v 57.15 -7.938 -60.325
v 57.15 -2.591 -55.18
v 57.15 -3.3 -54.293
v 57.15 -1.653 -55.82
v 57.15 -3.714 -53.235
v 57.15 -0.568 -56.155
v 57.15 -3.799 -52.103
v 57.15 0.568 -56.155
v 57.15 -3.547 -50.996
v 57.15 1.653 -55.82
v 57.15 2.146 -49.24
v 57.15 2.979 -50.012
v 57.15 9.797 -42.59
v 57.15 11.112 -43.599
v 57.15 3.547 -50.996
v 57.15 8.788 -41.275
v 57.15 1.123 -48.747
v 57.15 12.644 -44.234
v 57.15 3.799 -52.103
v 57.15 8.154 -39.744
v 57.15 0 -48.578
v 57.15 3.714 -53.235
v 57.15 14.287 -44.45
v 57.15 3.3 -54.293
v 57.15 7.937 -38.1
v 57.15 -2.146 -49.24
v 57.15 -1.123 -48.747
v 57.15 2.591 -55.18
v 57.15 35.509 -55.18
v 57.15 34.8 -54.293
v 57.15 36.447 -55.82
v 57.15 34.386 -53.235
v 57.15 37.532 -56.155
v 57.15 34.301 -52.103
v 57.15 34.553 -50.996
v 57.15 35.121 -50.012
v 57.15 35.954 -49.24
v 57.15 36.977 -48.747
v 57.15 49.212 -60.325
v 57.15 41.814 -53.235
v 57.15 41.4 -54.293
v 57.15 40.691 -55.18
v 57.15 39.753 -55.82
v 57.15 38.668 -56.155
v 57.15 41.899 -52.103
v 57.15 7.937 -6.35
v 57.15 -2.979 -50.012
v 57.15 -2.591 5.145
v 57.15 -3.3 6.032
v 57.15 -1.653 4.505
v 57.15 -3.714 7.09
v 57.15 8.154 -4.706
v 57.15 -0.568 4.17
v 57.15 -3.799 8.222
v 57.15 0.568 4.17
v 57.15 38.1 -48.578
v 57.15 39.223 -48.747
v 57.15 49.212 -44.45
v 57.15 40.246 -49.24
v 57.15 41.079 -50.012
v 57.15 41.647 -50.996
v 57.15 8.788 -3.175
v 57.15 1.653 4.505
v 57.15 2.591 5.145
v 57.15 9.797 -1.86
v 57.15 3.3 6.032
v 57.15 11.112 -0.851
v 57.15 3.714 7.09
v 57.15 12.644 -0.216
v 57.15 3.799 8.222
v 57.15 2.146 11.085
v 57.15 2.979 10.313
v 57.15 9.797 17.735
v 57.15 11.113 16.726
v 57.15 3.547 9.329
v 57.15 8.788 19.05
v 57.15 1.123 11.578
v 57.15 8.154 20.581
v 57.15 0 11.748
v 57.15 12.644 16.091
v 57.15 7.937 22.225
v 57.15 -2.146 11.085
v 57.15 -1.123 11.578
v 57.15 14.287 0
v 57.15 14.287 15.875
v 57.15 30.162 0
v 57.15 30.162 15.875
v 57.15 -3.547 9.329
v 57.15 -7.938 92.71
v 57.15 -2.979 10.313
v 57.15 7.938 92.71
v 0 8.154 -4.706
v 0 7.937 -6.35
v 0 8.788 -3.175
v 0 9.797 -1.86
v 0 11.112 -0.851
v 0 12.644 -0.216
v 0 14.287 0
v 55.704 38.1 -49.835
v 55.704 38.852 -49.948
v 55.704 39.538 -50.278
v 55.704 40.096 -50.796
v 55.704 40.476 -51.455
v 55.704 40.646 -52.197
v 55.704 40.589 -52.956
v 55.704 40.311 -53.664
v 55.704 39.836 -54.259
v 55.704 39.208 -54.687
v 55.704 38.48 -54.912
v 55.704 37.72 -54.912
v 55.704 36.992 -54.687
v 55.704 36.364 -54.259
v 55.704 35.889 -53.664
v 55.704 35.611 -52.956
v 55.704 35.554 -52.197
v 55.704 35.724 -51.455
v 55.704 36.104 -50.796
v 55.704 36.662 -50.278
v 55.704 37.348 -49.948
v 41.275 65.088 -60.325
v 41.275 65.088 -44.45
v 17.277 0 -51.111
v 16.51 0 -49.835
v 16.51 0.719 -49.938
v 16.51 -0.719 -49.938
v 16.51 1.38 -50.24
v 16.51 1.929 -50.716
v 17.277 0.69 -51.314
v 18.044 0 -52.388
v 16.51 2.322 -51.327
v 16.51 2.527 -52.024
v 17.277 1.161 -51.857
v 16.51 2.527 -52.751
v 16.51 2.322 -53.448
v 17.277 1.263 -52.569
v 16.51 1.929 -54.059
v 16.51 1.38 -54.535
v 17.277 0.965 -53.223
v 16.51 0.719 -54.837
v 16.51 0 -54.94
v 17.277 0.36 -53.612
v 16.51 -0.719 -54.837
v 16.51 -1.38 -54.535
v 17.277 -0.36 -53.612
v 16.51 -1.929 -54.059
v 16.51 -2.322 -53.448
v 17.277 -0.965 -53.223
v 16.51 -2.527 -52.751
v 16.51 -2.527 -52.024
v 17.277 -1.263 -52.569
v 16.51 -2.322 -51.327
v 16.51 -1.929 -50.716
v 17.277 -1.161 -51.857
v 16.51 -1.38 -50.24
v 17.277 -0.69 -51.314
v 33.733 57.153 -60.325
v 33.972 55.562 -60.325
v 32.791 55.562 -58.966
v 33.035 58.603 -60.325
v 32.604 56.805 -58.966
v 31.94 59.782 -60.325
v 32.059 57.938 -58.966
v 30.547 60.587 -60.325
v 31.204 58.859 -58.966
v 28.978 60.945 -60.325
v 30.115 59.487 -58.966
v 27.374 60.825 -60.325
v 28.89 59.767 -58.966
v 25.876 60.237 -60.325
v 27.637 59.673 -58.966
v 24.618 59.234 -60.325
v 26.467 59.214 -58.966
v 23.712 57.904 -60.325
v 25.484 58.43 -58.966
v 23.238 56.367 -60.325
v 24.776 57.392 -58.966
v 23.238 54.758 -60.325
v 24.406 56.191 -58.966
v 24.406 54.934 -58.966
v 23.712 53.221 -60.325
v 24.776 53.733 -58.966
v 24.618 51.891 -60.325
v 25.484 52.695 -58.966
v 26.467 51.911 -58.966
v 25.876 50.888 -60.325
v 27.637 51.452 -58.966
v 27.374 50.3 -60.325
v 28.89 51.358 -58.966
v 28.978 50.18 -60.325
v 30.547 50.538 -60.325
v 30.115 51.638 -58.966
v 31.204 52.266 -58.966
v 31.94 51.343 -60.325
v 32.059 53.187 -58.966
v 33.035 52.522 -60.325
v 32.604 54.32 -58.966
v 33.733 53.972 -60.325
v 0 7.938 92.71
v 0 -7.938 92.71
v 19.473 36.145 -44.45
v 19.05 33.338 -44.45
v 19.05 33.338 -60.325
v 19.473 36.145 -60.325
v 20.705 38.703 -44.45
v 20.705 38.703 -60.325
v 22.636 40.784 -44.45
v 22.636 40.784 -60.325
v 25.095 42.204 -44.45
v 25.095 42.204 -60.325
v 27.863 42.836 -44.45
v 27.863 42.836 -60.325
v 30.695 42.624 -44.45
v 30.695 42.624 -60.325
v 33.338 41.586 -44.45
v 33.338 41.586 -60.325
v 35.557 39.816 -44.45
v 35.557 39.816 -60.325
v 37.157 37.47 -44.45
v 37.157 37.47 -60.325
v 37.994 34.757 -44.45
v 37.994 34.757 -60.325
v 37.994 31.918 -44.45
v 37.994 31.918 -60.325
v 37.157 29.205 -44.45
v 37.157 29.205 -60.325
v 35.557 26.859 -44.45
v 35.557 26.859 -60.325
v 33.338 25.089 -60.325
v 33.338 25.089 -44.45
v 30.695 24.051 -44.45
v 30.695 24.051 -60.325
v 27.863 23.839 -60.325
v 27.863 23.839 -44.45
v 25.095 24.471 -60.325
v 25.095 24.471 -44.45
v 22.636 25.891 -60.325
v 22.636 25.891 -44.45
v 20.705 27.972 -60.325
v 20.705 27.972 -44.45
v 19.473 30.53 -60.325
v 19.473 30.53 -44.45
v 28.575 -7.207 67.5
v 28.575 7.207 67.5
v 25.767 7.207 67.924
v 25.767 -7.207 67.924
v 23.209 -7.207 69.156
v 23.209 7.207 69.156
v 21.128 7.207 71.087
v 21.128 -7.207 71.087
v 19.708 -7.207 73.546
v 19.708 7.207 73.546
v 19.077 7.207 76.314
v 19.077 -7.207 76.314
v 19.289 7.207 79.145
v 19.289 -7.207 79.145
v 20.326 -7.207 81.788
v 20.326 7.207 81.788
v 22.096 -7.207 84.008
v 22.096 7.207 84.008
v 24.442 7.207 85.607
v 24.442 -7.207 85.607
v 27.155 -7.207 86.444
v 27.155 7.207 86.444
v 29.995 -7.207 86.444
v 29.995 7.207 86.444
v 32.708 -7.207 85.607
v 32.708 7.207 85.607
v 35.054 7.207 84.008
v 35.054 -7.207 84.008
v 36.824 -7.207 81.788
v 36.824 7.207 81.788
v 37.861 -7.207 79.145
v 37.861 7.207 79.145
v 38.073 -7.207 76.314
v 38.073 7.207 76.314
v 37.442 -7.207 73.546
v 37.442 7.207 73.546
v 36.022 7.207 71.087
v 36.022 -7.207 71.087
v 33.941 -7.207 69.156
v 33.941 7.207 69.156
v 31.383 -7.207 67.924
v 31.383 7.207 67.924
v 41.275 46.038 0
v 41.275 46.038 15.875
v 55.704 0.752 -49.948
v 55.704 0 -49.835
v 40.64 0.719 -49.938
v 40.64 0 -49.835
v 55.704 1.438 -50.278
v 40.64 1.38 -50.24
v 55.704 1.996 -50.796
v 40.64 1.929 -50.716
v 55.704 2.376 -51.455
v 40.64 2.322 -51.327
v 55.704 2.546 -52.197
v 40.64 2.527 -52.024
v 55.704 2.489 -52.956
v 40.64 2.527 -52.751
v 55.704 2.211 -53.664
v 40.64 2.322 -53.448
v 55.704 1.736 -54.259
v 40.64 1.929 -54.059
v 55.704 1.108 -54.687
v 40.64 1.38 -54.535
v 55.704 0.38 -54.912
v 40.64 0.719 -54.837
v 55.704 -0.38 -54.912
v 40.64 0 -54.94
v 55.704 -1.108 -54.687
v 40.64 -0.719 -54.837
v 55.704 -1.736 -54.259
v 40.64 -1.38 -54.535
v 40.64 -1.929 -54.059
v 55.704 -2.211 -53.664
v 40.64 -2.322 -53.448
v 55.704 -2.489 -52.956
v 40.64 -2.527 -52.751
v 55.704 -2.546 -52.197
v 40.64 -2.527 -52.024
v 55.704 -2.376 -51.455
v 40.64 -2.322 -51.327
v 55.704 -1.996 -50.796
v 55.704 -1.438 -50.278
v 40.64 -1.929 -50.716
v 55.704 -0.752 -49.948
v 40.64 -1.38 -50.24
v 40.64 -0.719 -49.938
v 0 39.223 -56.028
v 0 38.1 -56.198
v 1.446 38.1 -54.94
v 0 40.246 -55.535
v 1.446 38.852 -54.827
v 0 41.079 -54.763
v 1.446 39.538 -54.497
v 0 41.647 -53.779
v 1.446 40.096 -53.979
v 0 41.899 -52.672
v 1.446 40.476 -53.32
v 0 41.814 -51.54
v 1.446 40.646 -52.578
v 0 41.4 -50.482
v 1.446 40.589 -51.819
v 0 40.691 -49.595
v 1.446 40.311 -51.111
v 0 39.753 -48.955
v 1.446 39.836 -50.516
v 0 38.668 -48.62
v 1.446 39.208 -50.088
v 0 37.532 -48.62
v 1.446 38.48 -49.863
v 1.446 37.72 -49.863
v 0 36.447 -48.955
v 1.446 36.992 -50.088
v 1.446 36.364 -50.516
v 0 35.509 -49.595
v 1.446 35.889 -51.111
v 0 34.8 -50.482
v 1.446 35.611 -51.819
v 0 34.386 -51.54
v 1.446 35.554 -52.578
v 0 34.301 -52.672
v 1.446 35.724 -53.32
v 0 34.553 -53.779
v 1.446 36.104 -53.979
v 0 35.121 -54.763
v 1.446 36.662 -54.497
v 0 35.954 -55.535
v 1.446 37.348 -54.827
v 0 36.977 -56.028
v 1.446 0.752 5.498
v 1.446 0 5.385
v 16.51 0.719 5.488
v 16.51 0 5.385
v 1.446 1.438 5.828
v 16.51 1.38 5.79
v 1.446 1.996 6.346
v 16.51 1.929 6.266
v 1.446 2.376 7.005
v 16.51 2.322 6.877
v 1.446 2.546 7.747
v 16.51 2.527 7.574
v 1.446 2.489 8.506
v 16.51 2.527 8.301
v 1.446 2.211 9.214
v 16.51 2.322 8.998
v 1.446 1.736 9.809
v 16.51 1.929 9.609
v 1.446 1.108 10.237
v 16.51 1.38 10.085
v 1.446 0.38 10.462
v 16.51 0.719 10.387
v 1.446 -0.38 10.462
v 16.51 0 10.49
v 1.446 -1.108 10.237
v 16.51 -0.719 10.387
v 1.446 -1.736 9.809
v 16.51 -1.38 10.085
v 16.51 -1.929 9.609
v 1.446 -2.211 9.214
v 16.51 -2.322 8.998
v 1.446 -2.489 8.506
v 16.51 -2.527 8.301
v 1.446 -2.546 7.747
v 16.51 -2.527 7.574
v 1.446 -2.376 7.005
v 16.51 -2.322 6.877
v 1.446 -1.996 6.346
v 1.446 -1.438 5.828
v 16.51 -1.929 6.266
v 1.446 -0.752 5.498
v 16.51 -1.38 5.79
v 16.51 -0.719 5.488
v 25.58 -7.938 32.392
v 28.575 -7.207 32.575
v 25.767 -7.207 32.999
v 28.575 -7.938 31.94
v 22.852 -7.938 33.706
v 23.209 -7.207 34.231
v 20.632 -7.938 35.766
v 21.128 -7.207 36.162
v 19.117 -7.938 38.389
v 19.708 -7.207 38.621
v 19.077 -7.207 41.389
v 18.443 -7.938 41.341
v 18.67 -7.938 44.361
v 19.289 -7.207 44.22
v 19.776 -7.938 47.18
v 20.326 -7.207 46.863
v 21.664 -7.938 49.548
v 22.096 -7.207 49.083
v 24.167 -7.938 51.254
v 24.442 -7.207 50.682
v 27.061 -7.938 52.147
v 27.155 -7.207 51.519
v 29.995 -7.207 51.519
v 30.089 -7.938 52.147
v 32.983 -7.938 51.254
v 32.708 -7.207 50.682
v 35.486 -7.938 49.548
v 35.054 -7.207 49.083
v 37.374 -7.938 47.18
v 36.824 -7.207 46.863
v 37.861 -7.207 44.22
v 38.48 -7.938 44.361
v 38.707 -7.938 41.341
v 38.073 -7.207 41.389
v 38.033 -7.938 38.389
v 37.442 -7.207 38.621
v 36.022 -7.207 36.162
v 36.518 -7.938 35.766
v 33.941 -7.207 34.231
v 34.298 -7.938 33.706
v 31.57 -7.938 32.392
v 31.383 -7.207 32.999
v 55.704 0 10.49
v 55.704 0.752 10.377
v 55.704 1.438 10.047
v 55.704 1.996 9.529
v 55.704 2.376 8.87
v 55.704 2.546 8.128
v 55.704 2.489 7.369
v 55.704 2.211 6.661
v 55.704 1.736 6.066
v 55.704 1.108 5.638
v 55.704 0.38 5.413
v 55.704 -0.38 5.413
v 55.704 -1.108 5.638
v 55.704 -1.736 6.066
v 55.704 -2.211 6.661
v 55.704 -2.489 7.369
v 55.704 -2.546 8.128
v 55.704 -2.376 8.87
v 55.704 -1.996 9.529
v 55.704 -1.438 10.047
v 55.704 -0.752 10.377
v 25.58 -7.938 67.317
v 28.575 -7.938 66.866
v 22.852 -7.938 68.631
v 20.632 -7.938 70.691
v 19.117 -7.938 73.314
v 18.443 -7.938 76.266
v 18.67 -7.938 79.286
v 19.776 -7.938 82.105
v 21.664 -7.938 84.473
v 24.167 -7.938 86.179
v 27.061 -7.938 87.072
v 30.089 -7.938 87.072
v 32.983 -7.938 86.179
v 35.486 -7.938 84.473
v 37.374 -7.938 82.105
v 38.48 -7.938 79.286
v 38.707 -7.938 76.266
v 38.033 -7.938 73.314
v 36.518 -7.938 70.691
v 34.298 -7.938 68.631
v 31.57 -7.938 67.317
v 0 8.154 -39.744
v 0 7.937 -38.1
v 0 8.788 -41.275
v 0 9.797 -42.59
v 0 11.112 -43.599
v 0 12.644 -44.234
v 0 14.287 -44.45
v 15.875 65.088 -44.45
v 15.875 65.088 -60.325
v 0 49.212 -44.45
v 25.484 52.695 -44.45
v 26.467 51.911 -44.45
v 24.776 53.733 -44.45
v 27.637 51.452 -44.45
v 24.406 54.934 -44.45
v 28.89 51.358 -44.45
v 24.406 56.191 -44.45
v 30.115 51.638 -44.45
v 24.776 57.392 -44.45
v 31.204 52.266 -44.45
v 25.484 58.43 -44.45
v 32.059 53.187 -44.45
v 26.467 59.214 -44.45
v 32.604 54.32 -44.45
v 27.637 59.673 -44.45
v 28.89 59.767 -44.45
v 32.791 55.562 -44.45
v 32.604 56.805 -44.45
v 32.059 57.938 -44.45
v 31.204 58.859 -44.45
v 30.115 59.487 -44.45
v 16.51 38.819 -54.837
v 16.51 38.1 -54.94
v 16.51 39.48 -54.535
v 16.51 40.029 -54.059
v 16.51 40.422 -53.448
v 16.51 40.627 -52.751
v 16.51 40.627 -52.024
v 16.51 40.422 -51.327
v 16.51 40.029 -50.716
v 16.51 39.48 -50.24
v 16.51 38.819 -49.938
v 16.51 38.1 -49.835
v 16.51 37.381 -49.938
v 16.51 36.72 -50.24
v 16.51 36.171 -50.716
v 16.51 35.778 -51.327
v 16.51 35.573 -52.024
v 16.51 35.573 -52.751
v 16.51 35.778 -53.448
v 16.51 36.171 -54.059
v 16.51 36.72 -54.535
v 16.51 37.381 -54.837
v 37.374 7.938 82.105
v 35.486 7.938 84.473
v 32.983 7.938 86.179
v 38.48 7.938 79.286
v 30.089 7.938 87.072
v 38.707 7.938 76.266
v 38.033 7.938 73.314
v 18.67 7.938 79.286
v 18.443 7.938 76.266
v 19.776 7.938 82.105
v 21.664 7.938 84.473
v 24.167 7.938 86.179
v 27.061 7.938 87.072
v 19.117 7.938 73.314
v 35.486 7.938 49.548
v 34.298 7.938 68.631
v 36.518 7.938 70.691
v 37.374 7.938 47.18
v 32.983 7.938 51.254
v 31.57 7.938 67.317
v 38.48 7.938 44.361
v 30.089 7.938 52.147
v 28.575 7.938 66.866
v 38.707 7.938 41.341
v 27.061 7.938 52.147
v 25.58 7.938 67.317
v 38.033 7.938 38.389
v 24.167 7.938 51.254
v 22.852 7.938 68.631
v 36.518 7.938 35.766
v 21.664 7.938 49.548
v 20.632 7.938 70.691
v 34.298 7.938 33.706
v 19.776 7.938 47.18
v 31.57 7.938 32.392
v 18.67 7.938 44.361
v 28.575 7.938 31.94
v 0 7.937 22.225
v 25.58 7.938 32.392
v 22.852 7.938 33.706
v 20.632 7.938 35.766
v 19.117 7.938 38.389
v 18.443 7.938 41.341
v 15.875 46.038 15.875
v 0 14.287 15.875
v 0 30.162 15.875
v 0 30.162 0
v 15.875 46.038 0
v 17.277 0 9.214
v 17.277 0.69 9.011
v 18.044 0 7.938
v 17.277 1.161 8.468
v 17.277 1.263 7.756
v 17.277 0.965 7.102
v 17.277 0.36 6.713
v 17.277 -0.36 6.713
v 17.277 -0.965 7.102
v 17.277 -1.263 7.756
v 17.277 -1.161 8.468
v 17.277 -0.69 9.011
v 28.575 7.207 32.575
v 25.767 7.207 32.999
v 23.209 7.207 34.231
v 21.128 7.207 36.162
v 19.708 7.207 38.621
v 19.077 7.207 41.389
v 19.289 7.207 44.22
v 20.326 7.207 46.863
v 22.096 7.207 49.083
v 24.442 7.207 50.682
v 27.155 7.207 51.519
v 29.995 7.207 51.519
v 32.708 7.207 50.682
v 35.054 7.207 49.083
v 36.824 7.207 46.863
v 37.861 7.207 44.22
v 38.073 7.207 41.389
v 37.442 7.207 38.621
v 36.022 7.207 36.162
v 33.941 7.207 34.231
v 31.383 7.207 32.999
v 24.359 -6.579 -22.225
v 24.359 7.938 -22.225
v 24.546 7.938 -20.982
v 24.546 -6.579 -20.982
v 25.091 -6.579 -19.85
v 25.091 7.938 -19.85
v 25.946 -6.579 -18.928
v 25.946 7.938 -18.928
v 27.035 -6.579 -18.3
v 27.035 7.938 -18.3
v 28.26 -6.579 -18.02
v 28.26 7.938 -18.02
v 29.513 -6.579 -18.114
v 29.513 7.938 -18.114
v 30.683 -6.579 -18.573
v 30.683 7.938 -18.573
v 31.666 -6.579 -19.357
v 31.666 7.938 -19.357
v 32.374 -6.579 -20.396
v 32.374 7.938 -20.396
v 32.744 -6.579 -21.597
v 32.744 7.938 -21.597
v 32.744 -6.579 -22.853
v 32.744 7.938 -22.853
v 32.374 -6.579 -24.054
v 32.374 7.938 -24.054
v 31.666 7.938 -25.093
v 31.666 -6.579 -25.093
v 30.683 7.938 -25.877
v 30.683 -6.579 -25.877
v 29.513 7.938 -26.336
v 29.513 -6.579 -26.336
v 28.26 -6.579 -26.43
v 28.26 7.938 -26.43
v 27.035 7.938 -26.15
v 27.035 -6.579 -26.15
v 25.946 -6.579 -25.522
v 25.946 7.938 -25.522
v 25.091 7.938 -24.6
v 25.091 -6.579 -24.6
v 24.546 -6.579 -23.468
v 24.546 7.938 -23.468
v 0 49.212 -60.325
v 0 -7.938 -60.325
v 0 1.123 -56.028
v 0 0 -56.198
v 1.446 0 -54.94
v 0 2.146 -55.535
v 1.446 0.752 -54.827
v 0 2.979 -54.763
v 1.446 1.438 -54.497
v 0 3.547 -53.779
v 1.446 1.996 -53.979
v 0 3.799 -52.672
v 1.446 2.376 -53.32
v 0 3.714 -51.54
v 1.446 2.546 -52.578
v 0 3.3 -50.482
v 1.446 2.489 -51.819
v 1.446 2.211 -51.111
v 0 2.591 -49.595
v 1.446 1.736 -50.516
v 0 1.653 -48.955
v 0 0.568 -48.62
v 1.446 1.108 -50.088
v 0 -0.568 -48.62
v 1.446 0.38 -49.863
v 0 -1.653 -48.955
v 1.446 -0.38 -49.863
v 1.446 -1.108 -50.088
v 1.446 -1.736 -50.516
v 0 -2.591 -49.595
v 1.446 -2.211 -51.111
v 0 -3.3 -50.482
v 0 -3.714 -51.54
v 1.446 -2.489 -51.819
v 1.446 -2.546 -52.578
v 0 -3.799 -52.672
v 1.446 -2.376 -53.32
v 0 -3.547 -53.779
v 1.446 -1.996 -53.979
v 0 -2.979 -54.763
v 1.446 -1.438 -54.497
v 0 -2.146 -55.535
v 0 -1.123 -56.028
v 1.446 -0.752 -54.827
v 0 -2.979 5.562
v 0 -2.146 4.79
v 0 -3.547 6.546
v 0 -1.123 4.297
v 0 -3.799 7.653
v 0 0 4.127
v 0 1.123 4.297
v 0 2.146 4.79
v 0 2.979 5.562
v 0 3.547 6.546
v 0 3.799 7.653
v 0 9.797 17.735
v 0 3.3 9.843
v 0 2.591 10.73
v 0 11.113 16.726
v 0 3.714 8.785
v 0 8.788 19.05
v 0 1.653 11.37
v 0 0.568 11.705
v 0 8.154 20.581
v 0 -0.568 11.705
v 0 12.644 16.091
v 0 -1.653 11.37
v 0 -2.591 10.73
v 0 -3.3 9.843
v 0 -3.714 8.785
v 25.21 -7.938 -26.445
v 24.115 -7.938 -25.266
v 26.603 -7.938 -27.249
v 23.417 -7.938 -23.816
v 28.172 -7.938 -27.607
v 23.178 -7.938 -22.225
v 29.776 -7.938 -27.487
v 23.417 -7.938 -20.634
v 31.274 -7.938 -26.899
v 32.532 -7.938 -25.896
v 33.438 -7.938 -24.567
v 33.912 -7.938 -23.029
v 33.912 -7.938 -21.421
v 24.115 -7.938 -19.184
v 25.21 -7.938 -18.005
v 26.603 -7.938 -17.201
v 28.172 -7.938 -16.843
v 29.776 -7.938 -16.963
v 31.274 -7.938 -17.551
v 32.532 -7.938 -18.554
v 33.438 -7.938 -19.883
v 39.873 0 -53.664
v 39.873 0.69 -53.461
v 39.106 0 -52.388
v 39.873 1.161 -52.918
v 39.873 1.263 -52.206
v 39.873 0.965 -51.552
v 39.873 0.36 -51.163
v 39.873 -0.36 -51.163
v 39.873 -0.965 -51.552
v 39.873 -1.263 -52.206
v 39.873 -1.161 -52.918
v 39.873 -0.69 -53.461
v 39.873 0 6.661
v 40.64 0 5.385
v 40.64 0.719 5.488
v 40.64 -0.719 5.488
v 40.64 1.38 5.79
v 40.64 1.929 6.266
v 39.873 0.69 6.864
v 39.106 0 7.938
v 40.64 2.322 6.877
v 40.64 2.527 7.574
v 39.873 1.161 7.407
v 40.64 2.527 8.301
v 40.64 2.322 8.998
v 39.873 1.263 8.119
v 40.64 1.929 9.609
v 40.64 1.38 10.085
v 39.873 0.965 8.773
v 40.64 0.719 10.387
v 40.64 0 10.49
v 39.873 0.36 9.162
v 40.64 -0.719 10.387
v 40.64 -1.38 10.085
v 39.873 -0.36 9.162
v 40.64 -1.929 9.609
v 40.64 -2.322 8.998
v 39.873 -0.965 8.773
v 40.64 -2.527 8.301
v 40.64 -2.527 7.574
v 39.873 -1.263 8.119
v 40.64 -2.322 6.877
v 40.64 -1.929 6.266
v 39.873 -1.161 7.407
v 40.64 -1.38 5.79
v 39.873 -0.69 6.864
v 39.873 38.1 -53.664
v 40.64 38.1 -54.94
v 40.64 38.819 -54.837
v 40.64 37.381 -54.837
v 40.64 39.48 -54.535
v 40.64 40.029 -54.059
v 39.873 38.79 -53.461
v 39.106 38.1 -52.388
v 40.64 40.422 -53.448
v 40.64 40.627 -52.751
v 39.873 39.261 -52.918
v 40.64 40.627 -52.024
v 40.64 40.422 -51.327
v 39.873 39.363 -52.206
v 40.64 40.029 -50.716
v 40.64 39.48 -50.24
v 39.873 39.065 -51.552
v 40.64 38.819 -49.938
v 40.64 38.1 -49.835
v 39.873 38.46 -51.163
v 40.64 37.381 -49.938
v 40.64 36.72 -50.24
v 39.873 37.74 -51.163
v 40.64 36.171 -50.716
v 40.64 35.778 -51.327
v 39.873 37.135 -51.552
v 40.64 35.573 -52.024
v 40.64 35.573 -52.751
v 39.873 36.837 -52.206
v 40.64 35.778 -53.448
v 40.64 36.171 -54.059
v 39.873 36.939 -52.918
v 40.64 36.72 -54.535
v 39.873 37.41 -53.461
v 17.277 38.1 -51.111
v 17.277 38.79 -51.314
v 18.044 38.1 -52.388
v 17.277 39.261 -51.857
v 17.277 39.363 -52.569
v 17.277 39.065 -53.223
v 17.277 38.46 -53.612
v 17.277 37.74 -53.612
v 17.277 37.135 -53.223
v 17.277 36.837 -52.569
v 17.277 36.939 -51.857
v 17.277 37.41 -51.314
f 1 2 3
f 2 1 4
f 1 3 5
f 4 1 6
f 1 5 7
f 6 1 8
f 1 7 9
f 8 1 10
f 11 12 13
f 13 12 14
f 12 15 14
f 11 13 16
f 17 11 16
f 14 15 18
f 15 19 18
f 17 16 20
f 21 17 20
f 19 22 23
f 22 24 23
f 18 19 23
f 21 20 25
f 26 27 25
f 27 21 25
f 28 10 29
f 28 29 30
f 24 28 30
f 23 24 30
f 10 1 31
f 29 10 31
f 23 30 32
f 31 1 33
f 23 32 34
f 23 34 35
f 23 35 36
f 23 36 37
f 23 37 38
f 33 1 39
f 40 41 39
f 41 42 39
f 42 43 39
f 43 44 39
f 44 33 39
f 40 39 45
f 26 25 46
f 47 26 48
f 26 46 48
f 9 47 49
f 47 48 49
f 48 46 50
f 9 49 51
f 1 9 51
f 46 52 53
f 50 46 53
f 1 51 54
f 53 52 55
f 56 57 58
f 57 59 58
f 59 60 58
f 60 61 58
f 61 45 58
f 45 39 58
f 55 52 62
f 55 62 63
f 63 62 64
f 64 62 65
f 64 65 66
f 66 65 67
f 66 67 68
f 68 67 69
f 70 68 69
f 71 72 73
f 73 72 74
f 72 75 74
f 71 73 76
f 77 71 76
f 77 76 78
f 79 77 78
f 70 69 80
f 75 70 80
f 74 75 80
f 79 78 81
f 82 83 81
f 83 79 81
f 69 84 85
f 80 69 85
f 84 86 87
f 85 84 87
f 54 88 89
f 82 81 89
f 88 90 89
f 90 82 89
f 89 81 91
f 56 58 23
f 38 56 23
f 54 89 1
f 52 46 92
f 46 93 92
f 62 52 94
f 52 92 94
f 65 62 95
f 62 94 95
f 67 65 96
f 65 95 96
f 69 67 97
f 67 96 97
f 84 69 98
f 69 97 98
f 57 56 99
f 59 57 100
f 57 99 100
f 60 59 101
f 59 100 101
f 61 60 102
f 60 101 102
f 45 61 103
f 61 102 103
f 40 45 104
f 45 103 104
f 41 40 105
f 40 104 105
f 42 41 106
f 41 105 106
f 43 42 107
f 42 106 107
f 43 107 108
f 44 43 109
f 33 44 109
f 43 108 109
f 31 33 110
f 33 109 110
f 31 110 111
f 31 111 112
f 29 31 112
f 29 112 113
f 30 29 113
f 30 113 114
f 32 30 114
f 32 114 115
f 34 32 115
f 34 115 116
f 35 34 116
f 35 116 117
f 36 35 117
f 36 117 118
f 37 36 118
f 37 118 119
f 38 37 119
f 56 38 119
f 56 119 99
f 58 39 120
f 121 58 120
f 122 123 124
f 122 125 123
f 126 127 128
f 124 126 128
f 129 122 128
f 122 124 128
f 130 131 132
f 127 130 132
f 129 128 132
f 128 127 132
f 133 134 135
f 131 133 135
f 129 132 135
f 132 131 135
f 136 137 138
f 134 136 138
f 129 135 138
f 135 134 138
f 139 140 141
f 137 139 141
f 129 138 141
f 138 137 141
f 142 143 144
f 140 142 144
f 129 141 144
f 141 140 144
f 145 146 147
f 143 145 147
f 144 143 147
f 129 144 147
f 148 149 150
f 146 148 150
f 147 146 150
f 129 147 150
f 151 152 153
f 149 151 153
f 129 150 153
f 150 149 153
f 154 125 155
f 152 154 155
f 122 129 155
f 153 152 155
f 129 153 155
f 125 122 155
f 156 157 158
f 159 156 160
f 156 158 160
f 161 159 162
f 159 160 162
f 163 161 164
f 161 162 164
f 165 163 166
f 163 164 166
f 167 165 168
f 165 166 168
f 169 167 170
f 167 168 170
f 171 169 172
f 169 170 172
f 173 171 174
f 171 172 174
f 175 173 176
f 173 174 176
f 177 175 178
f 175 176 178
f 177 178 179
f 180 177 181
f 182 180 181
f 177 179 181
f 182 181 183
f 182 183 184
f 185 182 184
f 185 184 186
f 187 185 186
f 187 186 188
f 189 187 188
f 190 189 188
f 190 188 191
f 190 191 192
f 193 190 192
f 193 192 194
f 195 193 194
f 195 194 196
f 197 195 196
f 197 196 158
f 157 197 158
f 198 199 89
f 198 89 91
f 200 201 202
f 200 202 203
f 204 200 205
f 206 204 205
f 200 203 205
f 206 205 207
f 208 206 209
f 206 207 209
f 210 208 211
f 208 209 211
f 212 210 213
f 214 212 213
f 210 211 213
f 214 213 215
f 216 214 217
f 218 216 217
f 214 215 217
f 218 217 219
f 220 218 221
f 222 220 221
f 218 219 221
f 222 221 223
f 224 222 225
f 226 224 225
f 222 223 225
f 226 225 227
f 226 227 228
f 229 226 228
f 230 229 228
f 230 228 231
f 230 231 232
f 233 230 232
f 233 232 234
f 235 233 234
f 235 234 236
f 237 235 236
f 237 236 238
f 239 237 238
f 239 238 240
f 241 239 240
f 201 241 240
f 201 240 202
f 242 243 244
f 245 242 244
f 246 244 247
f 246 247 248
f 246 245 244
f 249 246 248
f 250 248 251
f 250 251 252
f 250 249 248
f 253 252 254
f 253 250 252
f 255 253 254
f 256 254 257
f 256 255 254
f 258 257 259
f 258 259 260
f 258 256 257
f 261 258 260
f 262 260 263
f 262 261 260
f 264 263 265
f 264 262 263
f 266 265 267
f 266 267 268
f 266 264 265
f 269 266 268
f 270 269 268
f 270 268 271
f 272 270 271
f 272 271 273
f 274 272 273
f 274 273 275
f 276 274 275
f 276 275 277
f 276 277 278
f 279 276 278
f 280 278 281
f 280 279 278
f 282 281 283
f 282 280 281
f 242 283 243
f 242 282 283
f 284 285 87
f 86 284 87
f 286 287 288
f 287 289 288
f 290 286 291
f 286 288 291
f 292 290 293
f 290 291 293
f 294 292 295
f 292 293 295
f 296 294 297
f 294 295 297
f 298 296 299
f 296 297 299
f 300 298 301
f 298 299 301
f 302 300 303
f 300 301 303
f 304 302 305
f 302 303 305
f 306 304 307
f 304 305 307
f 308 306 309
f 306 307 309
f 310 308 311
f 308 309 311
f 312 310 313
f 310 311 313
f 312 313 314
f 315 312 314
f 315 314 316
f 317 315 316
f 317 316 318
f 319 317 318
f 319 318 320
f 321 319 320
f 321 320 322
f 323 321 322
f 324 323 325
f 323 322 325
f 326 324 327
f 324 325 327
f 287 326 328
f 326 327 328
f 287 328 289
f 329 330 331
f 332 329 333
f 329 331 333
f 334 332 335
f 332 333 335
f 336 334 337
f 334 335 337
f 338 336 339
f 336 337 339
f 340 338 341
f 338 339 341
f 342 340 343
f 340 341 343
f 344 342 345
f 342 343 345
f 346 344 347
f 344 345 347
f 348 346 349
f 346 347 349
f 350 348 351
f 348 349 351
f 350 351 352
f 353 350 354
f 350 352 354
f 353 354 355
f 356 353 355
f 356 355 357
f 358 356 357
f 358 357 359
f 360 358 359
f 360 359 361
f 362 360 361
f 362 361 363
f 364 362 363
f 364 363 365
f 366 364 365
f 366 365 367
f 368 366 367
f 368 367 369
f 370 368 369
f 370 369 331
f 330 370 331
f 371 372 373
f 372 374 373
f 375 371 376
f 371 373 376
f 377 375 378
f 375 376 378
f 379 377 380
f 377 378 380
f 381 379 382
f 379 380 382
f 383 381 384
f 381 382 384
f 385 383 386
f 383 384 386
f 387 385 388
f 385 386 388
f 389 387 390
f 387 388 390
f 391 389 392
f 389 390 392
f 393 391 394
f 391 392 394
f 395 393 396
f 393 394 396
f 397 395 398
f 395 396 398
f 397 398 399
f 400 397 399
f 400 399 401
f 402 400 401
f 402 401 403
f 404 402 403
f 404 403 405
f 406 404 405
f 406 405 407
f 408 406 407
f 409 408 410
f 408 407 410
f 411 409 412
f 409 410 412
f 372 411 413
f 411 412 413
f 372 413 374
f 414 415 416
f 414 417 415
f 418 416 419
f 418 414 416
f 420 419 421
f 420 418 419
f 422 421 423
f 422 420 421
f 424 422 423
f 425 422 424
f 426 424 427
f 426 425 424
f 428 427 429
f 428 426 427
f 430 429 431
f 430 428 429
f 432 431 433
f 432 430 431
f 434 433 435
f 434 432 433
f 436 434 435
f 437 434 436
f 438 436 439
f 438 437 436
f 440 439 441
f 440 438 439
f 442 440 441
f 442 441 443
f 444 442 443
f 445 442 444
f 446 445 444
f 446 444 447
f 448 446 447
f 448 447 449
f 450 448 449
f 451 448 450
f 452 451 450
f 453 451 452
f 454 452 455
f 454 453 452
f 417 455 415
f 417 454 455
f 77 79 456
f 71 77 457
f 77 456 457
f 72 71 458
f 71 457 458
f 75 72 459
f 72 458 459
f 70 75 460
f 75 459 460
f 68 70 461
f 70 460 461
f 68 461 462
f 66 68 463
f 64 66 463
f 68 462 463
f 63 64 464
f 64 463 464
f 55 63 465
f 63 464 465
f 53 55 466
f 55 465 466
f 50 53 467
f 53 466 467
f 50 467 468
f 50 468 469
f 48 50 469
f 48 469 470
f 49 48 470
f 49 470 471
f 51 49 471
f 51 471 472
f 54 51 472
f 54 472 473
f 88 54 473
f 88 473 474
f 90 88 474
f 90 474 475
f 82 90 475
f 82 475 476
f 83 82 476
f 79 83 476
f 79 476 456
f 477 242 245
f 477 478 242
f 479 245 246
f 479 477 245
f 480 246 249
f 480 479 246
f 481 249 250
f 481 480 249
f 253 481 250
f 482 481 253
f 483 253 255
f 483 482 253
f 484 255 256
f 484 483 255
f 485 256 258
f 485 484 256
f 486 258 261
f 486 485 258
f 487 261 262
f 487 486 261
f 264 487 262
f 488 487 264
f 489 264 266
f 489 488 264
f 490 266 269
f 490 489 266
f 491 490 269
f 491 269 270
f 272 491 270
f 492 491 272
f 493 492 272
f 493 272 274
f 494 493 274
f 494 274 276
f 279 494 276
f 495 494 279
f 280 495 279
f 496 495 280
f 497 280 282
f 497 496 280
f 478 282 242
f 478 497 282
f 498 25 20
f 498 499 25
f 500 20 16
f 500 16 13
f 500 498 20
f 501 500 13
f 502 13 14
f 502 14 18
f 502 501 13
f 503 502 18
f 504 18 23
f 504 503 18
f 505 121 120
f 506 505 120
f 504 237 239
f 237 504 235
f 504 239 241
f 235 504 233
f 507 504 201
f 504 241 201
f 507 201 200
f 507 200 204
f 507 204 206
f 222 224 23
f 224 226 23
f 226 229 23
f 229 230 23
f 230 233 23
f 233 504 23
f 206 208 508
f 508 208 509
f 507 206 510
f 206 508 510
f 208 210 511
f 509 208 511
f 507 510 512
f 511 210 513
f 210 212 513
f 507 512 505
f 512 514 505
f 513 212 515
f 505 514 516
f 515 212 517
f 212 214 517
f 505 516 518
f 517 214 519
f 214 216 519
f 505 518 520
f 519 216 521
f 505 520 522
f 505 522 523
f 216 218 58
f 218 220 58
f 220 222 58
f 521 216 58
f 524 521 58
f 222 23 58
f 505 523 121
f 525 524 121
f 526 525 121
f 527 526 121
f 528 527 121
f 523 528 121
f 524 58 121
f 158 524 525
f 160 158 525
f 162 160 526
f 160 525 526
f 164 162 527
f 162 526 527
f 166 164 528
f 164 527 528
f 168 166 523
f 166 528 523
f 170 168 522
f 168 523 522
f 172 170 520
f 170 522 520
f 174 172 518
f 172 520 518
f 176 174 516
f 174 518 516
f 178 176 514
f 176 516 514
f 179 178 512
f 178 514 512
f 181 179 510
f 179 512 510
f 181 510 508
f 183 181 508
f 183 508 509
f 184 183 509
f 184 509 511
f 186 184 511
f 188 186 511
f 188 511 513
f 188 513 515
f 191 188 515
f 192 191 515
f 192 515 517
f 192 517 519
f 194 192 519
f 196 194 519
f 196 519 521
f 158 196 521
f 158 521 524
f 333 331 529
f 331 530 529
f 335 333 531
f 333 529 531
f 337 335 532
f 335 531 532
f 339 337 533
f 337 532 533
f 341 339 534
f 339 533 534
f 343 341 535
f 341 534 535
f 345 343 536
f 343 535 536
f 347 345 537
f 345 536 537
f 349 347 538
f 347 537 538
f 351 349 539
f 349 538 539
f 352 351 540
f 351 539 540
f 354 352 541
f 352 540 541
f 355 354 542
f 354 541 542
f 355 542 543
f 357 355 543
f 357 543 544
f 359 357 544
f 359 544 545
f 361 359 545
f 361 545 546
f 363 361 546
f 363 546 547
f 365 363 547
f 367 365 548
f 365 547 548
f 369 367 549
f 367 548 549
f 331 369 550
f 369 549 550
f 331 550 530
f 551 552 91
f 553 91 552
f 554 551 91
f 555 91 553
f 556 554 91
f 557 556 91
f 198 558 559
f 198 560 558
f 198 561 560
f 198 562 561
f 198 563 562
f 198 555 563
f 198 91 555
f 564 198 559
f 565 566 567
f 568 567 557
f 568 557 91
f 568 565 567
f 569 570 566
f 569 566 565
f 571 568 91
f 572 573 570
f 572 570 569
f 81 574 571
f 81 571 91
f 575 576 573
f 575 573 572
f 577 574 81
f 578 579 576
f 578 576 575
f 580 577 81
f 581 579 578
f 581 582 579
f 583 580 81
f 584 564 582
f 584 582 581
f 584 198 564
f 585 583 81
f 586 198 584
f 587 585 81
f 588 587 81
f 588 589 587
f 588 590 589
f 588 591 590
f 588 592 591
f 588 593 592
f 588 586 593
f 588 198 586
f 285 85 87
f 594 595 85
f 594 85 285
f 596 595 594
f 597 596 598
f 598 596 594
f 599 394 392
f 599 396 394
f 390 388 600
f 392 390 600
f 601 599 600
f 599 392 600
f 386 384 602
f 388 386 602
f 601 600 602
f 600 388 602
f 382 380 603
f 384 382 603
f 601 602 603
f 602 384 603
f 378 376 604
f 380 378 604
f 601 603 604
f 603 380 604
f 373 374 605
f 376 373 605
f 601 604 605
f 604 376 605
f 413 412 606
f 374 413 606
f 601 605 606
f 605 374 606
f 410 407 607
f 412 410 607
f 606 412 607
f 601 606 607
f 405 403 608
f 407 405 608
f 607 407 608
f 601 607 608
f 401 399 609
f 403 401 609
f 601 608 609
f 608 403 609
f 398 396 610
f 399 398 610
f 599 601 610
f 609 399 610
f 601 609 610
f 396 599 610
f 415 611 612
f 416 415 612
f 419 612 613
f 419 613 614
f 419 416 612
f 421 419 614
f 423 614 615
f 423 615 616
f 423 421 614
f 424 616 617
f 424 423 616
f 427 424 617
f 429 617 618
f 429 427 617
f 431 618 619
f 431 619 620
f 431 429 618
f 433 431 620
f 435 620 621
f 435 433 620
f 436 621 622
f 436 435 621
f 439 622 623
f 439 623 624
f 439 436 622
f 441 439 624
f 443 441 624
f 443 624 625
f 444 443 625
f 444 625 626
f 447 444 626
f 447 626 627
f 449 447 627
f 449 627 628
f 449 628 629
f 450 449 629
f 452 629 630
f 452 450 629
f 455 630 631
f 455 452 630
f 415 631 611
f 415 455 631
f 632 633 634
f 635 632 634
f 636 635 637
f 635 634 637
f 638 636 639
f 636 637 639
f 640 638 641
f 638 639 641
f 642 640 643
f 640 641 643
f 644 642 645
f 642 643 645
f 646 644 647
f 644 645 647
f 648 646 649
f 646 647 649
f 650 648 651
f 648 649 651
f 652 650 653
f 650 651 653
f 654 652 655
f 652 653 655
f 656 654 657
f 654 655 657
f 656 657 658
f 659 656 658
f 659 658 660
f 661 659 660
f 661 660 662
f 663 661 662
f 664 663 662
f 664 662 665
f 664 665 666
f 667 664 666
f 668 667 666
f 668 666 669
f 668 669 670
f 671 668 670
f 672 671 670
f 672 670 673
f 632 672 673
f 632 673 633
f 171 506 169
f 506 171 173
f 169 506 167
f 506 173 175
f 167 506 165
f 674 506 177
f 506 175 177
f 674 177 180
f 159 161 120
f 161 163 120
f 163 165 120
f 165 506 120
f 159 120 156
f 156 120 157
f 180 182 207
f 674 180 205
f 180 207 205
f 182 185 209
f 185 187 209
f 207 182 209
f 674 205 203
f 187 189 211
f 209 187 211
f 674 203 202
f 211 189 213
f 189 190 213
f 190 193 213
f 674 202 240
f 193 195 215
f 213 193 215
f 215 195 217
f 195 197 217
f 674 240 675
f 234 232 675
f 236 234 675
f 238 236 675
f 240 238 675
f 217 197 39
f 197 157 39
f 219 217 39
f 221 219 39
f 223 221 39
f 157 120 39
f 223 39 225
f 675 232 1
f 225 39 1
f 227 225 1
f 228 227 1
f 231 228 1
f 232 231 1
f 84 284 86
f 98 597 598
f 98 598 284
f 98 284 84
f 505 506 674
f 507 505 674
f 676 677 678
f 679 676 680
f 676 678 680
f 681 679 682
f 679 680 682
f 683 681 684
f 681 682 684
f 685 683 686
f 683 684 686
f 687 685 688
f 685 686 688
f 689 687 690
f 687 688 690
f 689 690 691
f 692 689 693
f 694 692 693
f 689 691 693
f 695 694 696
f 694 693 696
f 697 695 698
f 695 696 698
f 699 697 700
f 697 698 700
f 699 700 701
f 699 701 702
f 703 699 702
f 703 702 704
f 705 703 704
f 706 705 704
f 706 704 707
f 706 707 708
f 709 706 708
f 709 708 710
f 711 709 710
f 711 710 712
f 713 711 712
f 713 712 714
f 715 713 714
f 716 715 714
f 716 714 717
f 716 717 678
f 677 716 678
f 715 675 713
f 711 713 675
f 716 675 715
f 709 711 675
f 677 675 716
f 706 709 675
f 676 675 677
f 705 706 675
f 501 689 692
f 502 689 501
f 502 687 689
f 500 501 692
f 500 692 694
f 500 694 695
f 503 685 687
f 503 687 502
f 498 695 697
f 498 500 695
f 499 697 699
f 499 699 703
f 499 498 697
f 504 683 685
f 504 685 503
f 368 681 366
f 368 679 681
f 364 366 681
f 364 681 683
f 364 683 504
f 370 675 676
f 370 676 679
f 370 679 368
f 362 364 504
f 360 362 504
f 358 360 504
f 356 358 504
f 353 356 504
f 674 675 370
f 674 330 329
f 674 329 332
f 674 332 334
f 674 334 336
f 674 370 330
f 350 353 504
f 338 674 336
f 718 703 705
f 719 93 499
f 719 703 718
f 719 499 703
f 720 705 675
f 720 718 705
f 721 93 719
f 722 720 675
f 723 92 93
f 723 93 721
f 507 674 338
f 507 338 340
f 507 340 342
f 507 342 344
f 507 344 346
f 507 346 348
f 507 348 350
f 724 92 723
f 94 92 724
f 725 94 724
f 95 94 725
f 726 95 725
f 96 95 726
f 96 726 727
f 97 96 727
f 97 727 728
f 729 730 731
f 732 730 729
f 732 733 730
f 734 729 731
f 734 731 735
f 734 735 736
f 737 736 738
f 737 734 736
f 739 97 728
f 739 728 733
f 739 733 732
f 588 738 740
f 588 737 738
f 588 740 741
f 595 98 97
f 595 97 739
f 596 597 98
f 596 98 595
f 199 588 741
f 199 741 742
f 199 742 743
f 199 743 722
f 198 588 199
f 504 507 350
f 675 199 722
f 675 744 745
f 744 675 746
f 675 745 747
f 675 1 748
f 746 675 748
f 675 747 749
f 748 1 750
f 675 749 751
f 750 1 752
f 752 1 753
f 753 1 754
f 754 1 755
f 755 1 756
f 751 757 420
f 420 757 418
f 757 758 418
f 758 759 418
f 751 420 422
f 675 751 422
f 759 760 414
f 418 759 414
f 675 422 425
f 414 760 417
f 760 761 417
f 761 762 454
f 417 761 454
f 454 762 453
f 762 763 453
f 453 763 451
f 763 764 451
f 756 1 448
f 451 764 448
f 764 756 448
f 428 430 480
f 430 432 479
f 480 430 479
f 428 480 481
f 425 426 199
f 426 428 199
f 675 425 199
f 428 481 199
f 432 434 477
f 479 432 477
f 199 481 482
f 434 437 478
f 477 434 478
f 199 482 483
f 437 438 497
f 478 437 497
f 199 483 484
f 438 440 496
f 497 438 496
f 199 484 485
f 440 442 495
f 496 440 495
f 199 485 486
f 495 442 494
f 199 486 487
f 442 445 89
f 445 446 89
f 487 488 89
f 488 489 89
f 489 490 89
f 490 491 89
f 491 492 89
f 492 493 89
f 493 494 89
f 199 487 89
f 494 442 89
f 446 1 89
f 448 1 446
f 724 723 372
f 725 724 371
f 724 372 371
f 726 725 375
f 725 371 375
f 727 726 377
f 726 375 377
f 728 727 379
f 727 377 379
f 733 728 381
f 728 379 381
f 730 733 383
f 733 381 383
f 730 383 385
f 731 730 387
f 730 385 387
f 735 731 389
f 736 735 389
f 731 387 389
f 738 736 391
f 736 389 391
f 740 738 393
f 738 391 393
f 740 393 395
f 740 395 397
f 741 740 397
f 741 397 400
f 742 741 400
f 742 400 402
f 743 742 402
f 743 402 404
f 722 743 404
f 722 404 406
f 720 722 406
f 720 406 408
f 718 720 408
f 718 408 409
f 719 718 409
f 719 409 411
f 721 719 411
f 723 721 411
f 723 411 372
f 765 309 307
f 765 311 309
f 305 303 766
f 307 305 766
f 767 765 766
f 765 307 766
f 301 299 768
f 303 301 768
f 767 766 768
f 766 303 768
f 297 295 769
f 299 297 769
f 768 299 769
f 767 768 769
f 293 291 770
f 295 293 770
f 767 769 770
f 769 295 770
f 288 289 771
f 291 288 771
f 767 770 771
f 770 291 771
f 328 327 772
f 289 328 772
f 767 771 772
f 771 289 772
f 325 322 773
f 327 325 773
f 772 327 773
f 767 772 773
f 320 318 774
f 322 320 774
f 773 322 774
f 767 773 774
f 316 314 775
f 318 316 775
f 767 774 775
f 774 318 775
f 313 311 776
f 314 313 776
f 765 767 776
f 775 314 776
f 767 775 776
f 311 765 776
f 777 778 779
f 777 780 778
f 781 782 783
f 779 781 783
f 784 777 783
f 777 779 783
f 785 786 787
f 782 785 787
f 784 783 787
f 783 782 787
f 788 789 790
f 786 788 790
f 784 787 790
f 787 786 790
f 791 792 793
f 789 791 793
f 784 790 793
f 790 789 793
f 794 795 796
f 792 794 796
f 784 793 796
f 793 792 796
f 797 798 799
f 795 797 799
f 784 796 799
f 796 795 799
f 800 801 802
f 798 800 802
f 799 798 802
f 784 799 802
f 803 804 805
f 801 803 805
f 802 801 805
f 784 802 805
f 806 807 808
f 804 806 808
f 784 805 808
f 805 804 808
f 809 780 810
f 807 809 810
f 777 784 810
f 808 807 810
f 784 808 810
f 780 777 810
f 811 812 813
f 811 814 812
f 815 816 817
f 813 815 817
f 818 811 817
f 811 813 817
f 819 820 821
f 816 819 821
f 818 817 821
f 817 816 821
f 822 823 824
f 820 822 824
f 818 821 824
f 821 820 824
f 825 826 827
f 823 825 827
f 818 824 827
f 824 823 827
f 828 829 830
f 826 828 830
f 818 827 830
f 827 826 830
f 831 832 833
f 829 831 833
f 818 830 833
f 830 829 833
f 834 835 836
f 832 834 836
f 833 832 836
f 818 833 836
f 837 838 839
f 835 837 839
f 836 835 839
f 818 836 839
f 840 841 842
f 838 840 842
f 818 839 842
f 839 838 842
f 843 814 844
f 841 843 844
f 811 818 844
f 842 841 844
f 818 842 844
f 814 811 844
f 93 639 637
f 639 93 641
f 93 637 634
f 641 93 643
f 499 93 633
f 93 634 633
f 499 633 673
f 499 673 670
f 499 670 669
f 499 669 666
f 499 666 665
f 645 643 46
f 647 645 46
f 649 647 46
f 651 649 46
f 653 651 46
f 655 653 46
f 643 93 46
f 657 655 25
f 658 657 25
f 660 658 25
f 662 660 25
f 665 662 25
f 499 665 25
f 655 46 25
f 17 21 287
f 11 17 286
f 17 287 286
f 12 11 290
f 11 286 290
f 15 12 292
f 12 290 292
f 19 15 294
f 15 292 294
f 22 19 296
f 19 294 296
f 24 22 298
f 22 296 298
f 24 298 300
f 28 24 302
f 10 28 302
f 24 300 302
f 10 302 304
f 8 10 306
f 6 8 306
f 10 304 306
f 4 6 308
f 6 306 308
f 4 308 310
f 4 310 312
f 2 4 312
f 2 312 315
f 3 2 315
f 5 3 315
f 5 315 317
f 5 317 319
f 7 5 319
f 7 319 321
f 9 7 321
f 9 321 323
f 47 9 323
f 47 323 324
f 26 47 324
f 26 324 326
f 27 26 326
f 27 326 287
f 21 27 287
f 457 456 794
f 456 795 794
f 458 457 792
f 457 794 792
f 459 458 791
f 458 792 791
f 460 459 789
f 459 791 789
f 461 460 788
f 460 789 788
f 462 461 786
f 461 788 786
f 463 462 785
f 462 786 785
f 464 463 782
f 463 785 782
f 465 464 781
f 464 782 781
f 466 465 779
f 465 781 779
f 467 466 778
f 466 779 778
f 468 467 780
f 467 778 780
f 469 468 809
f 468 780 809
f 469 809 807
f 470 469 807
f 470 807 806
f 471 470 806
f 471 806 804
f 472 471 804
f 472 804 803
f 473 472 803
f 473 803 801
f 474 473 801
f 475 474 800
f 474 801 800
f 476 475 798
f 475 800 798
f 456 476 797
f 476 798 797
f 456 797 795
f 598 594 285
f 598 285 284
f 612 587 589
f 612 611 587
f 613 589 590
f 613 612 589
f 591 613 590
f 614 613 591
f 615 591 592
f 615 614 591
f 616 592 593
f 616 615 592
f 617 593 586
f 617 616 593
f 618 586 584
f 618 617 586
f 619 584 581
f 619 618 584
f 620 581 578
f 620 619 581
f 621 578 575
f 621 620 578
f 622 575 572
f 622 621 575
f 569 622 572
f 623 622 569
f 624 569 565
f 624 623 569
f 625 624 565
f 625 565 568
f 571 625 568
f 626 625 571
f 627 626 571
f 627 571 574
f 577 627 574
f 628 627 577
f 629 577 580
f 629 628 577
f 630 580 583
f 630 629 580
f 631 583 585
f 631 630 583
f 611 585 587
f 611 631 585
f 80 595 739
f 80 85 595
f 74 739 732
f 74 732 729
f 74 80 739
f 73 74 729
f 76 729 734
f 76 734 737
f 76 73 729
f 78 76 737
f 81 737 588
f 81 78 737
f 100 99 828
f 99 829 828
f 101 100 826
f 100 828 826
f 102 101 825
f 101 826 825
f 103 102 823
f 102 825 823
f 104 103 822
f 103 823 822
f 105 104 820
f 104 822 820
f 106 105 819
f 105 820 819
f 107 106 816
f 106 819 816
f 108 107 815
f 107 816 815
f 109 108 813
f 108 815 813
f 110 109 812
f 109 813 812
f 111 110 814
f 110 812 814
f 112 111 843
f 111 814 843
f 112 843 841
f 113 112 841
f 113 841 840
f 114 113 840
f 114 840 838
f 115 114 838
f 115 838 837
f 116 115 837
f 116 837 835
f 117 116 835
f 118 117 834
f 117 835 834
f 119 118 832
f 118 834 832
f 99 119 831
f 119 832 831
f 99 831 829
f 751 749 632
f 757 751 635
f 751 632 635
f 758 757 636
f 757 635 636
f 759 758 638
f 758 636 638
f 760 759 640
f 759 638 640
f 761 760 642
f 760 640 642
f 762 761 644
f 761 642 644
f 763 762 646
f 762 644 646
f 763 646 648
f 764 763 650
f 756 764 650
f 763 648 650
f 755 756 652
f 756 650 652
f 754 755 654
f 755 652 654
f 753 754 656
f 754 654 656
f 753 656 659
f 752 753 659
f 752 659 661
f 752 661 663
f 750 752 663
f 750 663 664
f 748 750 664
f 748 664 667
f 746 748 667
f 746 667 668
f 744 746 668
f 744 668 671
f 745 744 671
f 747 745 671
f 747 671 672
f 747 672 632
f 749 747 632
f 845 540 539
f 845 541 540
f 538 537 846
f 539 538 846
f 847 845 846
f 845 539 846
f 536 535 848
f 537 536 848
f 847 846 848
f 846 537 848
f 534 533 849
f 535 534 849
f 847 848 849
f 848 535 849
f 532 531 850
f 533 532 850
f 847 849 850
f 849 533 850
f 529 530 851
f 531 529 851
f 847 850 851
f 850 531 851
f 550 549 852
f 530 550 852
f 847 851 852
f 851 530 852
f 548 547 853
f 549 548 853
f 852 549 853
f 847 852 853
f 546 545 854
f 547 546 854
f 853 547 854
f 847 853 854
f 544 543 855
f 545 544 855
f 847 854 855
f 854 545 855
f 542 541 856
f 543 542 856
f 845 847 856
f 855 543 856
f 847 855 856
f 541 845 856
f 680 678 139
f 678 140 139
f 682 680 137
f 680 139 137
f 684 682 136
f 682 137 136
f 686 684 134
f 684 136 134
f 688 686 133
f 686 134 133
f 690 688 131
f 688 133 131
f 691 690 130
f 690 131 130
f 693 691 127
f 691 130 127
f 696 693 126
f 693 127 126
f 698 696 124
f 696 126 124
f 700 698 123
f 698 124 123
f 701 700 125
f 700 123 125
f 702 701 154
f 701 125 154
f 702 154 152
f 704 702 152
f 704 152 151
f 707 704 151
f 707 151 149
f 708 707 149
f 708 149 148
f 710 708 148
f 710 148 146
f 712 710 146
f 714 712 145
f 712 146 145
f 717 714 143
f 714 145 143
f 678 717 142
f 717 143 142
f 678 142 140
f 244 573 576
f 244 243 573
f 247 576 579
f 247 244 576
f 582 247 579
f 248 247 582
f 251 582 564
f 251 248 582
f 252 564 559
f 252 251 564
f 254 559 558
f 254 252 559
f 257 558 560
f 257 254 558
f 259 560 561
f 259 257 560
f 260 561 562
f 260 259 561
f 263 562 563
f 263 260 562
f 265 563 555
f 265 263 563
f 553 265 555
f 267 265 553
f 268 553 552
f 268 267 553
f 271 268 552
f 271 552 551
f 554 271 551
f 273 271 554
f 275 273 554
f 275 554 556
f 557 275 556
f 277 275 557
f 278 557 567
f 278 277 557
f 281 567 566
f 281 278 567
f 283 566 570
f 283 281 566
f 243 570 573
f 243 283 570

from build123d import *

# Parameters (mm, degrees)
EXTRUDE4_DEPTH                    = 57.15
EXTRUDE7_DEPTH                    = 57.15
CUT_EXTRUDE2_REACH                = 155.035
SKETCH10_R                        = 9.525
F_3_8_24_TAPPED_HOLE1_D           = 8.4328
F_3_8_24_TAPPED_HOLE1_DEPTH       = 15.875
F_3_8_24_TAPPED_HOLE1_CSINK_D     = 10.795
F_3_8_24_TAPPED_HOLE1_CSINK_ANGLE = 82
F_3_8_24_TAPPED_HOLE2_D           = 8.4328
F_3_8_24_TAPPED_HOLE2_DEPTH       = 15.875
F_3_8_24_TAPPED_HOLE2_CSINK_D     = 10.795
F_3_8_24_TAPPED_HOLE2_CSINK_ANGLE = 82
F_1_4_20_TAPPED_HOLE1_D           = 5.1054
F_1_4_20_TAPPED_HOLE1_DEPTH       = 16.51
F_1_4_20_TAPPED_HOLE1_CSINK_D     = 7.62
F_1_4_20_TAPPED_HOLE1_CSINK_ANGLE = 82
F_1_4_20_TAPPED_HOLE1_TIP         = 1.533816902
F_1_4_20_TAPPED_HOLE2_D           = 5.1054
F_1_4_20_TAPPED_HOLE2_DEPTH       = 16.51
F_1_4_20_TAPPED_HOLE2_CSINK_D     = 7.62
F_1_4_20_TAPPED_HOLE2_CSINK_ANGLE = 82
F_1_4_20_TAPPED_HOLE2_TIP         = 1.533816902
CUT_EXTRUDE3_REACH                = 155.035
F_1_2_CLEARANCE_HOLE1_AT_2_COUNT  = 2
F_1_2_CLEARANCE_HOLE1_AT_2_PITCH  = 34.925
CUT_EXTRUDE4_REACH                = 78.2
FILLET4_R                         = 6.35


with BuildPart() as part:
    # Sketch5 → Extrude4 (new body)
    with BuildSketch(Plane(origin=(0, 0, 0), x_dir=(0, 0, -1), z_dir=(1, 0, 0))):
        Polygon((0, 46.0375), (0, -7.9375), (-92.71, -7.9375), (-92.71, 7.9375), (-15.875, 7.9375), (-15.875, 46.0375), align=None)
    extrude(amount=EXTRUDE4_DEPTH)

    # Sketch9 → Extrude7 (add)
    with BuildSketch(Plane(origin=(57.15, 0, 0), x_dir=(0, 0, -1), z_dir=(1, 0, 0))):
        Polygon((0, 7.9375), (44.45, 7.9375), (44.45, 65.0875), (60.325, 65.0875), (60.325, -7.9375), (0, -7.9375), align=None)
    extrude(amount=-EXTRUDE7_DEPTH)

    # Sketch10 → Cut-Extrude2 (cut, up to next)
    with BuildSketch(Plane(origin=(0, 0, -60.325), x_dir=(-1, 0, 0), z_dir=(0, 0, -1)), mode=Mode.PRIVATE) as cut_extrude2_sk1:
        with Locations((-28.575, 33.3375)):
            Circle(SKETCH10_R)
    cut_extrude2_tool1 = extrude(cut_extrude2_sk1.sketch, amount=-CUT_EXTRUDE2_REACH, mode=Mode.PRIVATE) & part.part
    add(cut_extrude2_tool1.solids().sort_by_distance((28.575, 33.3375, -60.325))[0], mode=Mode.SUBTRACT)

    # 3/8-24 Tapped Hole1
    with Locations(Plane(origin=(0, 0, -60.325), x_dir=(-1, 0, 0), z_dir=(0, 0, -1))):
        with Locations((-28.575, 55.5625)):
            CounterSinkHole(F_3_8_24_TAPPED_HOLE1_D / 2, F_3_8_24_TAPPED_HOLE1_CSINK_D / 2, depth=F_3_8_24_TAPPED_HOLE1_DEPTH, counter_sink_angle=F_3_8_24_TAPPED_HOLE1_CSINK_ANGLE)

    # 3/8-24 Tapped Hole2
    with Locations(Plane.XZ.offset(7.9375)):
        with Locations((28.575, -22.225)):
            CounterSinkHole(F_3_8_24_TAPPED_HOLE2_D / 2, F_3_8_24_TAPPED_HOLE2_CSINK_D / 2, depth=F_3_8_24_TAPPED_HOLE2_DEPTH, counter_sink_angle=F_3_8_24_TAPPED_HOLE2_CSINK_ANGLE)

    # 1/4-20 Tapped Hole1
    with Locations(Plane.ZY):
        with Locations((-52.3875, 0), (7.9375, 0), (-52.3875, 38.1)):
            CounterSinkHole(F_1_4_20_TAPPED_HOLE1_D / 2, F_1_4_20_TAPPED_HOLE1_CSINK_D / 2, depth=F_1_4_20_TAPPED_HOLE1_DEPTH, counter_sink_angle=F_1_4_20_TAPPED_HOLE1_CSINK_ANGLE)
            with Locations((0, 0, -(F_1_4_20_TAPPED_HOLE1_DEPTH + F_1_4_20_TAPPED_HOLE1_TIP / 2))):  # 118° drill point
                Cone(0, F_1_4_20_TAPPED_HOLE1_D / 2, F_1_4_20_TAPPED_HOLE1_TIP, mode=Mode.SUBTRACT)

    # 1/4-20 Tapped Hole2
    with Locations(Plane(origin=(57.15, 0, 0), x_dir=(0, 0, -1), z_dir=(1, 0, 0))):
        with Locations((52.3875, 0), (-7.9375, 0), (52.3875, 38.1)):
            CounterSinkHole(F_1_4_20_TAPPED_HOLE2_D / 2, F_1_4_20_TAPPED_HOLE2_CSINK_D / 2, depth=F_1_4_20_TAPPED_HOLE2_DEPTH, counter_sink_angle=F_1_4_20_TAPPED_HOLE2_CSINK_ANGLE)
            with Locations((0, 0, -(F_1_4_20_TAPPED_HOLE2_DEPTH + F_1_4_20_TAPPED_HOLE2_TIP / 2))):  # 118° drill point
                Cone(0, F_1_4_20_TAPPED_HOLE2_D / 2, F_1_4_20_TAPPED_HOLE2_TIP, mode=Mode.SUBTRACT)

    # Sketch19 → Cut-Extrude3 (cut, up to next)
    with BuildSketch(Plane(origin=(0, 0, -60.325), x_dir=(-1, 0, 0), z_dir=(0, 0, -1)), mode=Mode.PRIVATE) as cut_extrude3_sk1:
        Polygon((-57.15, 49.2125), (-41.275, 65.0875), (-57.15, 65.0875), align=None)
    cut_extrude3_tool1 = extrude(cut_extrude3_sk1.sketch, amount=-CUT_EXTRUDE3_REACH, mode=Mode.PRIVATE) & part.part
    add(cut_extrude3_tool1.solids().sort_by_distance((51.858333, 59.795833, -60.325))[0], mode=Mode.SUBTRACT)
    # Sketch19 → Cut-Extrude3 (cut, up to next)
    with BuildSketch(Plane(origin=(0, 0, -60.325), x_dir=(-1, 0, 0), z_dir=(0, 0, -1)), mode=Mode.PRIVATE) as cut_extrude3_sk2:
        Polygon((0, 49.2125), (0, 65.0875), (-15.875, 65.0875), align=None)
    cut_extrude3_tool2 = extrude(cut_extrude3_sk2.sketch, amount=-CUT_EXTRUDE3_REACH, mode=Mode.PRIVATE) & part.part
    add(cut_extrude3_tool2.solids().sort_by_distance((5.291667, 59.795833, -60.325))[0], mode=Mode.SUBTRACT)

    # Sketch22 → 1/2 Clearance Hole1 (revolve, cut)
    with BuildSketch(Plane(origin=(28.575, -7.9375, 77.0255), x_dir=(0, 0, -1), z_dir=(1, 0, 0))):
        Polygon((0, 0), (0, 15.875), (10.16, 15.875), (9.525, 15.144516061), (9.525, 0.730483939), (10.16, 0), align=None)
    f_1_2_clearance_hole1 = revolve(axis=Axis((28.575, -14.2875, 77.0255), (0, 1, 0)), mode=Mode.SUBTRACT)

    # 1/2 Clearance Hole1 at 2: 1/2 Clearance Hole1 ×2
    with Locations(*[(0, 0, -i * F_1_2_CLEARANCE_HOLE1_AT_2_PITCH) for i in range(1, F_1_2_CLEARANCE_HOLE1_AT_2_COUNT)]):
        add(f_1_2_clearance_hole1, mode=Mode.SUBTRACT)

    # Sketch24 → Cut-Extrude4 (cut, up to next)
    with BuildSketch(Plane.XY.offset(15.875), mode=Mode.PRIVATE) as cut_extrude4_sk1:
        Polygon((0, 30.1625), (15.875, 46.0375), (0, 46.0375), align=None)
    cut_extrude4_tool1 = extrude(cut_extrude4_sk1.sketch, amount=-CUT_EXTRUDE4_REACH, mode=Mode.PRIVATE) & part.part
    add(cut_extrude4_tool1.solids().sort_by_distance((5.291667, 40.745833, 15.875))[0], mode=Mode.SUBTRACT)
    # Sketch24 → Cut-Extrude4 (cut, up to next)
    with BuildSketch(Plane.XY.offset(15.875), mode=Mode.PRIVATE) as cut_extrude4_sk2:
        Polygon((57.15, 30.1625), (57.15, 46.0375), (41.275, 46.0375), align=None)
    cut_extrude4_tool2 = extrude(cut_extrude4_sk2.sketch, amount=-CUT_EXTRUDE4_REACH, mode=Mode.PRIVATE) & part.part
    add(cut_extrude4_tool2.solids().sort_by_distance((51.858333, 40.745833, 15.875))[0], mode=Mode.SUBTRACT)

    # Fillet4
    fillet4_edges = [part.edges().sort_by_distance(p)[0] for p in [
        (28.575, 7.9375, 0),
        (28.575, 7.9375, -44.45),
        (28.575, 7.9375, 15.875),
    ]]
    fillet(fillet4_edges, radius=FILLET4_R)


solid = part.part
